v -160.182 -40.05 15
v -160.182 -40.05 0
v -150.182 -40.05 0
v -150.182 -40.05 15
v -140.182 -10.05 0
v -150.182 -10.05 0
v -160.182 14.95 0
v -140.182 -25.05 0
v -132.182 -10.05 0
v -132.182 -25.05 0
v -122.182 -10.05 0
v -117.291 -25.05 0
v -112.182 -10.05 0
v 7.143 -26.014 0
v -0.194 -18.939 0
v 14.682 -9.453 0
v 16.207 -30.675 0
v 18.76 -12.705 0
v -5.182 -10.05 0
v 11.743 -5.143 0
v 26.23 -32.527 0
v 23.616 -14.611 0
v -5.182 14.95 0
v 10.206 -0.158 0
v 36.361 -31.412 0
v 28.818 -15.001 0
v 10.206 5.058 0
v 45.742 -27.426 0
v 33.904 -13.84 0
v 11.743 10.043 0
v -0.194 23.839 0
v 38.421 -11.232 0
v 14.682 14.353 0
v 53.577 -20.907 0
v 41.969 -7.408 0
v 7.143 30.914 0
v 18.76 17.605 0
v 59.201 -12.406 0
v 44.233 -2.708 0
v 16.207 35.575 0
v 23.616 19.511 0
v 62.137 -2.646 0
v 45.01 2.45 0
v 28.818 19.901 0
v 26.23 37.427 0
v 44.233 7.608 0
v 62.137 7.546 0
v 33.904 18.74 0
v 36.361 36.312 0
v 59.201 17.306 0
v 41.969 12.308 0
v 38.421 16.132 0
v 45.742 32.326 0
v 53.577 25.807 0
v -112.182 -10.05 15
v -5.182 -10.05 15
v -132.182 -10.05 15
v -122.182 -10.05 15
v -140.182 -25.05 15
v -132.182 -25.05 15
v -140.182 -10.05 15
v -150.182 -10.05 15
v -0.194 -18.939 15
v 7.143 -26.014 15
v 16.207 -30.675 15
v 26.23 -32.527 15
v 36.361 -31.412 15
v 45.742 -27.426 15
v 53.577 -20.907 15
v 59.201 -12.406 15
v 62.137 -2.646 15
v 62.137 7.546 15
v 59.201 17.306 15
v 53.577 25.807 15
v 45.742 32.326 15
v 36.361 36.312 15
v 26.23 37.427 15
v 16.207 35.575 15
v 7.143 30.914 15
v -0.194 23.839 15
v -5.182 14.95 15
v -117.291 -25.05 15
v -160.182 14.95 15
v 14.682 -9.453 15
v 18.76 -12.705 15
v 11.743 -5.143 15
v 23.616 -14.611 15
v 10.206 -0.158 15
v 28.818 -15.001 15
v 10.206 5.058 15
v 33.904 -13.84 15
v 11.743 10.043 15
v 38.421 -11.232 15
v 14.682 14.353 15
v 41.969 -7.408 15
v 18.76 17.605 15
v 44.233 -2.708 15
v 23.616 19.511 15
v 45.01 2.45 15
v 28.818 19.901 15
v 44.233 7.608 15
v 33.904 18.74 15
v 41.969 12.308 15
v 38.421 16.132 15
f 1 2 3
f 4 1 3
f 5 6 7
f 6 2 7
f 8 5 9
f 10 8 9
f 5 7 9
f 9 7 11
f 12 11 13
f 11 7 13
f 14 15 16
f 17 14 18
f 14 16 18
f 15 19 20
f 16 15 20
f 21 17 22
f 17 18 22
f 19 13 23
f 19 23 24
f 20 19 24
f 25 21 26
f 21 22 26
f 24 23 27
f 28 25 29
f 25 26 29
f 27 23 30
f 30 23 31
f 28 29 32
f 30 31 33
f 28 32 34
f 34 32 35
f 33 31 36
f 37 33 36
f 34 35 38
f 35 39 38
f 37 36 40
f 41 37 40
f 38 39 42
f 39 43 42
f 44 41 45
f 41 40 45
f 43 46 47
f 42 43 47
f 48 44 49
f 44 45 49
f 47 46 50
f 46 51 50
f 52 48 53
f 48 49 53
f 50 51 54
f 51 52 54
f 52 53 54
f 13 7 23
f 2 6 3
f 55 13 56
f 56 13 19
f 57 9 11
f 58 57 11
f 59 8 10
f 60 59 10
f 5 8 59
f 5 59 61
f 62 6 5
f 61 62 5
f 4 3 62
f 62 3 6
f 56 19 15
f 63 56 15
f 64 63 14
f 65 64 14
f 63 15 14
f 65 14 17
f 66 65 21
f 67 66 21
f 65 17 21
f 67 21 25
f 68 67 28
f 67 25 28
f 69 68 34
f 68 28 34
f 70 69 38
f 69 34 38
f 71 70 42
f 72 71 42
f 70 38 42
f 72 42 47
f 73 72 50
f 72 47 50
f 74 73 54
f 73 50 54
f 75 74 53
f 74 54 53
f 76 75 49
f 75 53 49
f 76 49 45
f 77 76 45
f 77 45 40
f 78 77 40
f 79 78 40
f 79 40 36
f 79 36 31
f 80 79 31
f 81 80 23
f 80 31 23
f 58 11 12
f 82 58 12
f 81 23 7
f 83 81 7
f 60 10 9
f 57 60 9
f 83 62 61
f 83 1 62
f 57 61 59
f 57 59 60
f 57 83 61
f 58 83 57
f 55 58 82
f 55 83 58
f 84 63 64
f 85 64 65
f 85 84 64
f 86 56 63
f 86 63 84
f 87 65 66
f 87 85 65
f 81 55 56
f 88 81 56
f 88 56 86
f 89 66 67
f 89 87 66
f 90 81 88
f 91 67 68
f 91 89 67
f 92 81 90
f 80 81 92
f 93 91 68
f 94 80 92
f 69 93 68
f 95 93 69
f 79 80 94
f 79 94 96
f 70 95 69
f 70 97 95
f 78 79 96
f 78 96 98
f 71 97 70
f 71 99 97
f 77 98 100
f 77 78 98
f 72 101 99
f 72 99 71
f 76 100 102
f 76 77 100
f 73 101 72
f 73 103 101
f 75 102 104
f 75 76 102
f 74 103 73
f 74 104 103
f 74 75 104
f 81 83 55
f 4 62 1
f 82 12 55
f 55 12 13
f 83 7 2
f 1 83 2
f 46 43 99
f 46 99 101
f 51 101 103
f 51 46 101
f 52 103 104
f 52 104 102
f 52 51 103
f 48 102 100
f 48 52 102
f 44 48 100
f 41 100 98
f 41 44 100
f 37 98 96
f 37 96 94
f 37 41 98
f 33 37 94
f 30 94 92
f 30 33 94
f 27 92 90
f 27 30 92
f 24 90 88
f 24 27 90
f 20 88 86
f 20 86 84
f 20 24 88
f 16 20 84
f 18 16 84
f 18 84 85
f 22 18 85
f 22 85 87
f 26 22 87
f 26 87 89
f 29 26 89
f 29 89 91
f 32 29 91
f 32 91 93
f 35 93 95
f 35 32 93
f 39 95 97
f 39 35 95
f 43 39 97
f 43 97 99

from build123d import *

# Parameters (mm, degrees)
F0_W     = 10
F0_H     = 30
F0_W_2   = 8
F0_H_2   = 15
F0_R     = 17.5
F1_DEPTH = 15


with BuildPart() as f1:
    # F0 (on Top) → F1 (new body)
    with BuildSketch(Plane.XY):
        Polygon((-5.181603, 14.949999), (-160.181603, 14.949999), (-160.181603, -10.050001), (-150.181603, -10.050001), (-140.181603, -10.050001), (-132.181603, -10.050001), (-122.181603, -10.050001), (-112.181603, -10.050001), (-5.181603, -10.050001), align=None)
        with Locations((-155.181603, -25.050001)):
            Rectangle(F0_W, F0_H)
        with Locations((-136.181603, -17.550001)):
            Rectangle(F0_W_2, F0_H_2)
        Polygon((-117.290795, -25.050001), (-112.181603, -10.050001), (-122.181603, -10.050001), align=None)
        with BuildLine():
            ThreePointArc((-5.181603, -10.050001), (62.510139, 2.449999), (-5.181603, 14.949999))
            Line((-5.181603, 14.949999), (-5.181603, -10.050001))
        make_face()
        with Locations((27.510139, 2.449999)):
            Circle(F0_R, mode=Mode.SUBTRACT)
    extrude(amount=F1_DEPTH)


solid = f1.part
